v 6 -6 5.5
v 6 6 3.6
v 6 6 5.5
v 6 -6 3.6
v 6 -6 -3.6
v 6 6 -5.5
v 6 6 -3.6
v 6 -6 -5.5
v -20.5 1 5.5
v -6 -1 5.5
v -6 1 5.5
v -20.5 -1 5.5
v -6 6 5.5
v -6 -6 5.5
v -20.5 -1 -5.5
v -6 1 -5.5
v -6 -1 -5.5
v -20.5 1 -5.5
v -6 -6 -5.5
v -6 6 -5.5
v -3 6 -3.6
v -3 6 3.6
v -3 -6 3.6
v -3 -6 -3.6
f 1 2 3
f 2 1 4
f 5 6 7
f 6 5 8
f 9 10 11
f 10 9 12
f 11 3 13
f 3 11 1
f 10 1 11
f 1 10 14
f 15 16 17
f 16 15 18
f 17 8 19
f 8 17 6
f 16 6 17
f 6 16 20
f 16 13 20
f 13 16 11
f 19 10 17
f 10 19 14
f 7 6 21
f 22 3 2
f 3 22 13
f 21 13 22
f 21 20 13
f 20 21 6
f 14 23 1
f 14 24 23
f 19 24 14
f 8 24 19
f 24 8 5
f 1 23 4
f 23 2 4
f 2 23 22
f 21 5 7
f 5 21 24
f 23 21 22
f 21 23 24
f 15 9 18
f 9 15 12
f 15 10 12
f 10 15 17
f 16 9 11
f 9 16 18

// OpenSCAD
difference()
{
cube([12,12,11], center=true);
translate([2,0,0])cube([10,12,7.2], center=true); 
}
rotate([90,0,0])translate([-13,0,0])cube([15,11,2], center=true);
